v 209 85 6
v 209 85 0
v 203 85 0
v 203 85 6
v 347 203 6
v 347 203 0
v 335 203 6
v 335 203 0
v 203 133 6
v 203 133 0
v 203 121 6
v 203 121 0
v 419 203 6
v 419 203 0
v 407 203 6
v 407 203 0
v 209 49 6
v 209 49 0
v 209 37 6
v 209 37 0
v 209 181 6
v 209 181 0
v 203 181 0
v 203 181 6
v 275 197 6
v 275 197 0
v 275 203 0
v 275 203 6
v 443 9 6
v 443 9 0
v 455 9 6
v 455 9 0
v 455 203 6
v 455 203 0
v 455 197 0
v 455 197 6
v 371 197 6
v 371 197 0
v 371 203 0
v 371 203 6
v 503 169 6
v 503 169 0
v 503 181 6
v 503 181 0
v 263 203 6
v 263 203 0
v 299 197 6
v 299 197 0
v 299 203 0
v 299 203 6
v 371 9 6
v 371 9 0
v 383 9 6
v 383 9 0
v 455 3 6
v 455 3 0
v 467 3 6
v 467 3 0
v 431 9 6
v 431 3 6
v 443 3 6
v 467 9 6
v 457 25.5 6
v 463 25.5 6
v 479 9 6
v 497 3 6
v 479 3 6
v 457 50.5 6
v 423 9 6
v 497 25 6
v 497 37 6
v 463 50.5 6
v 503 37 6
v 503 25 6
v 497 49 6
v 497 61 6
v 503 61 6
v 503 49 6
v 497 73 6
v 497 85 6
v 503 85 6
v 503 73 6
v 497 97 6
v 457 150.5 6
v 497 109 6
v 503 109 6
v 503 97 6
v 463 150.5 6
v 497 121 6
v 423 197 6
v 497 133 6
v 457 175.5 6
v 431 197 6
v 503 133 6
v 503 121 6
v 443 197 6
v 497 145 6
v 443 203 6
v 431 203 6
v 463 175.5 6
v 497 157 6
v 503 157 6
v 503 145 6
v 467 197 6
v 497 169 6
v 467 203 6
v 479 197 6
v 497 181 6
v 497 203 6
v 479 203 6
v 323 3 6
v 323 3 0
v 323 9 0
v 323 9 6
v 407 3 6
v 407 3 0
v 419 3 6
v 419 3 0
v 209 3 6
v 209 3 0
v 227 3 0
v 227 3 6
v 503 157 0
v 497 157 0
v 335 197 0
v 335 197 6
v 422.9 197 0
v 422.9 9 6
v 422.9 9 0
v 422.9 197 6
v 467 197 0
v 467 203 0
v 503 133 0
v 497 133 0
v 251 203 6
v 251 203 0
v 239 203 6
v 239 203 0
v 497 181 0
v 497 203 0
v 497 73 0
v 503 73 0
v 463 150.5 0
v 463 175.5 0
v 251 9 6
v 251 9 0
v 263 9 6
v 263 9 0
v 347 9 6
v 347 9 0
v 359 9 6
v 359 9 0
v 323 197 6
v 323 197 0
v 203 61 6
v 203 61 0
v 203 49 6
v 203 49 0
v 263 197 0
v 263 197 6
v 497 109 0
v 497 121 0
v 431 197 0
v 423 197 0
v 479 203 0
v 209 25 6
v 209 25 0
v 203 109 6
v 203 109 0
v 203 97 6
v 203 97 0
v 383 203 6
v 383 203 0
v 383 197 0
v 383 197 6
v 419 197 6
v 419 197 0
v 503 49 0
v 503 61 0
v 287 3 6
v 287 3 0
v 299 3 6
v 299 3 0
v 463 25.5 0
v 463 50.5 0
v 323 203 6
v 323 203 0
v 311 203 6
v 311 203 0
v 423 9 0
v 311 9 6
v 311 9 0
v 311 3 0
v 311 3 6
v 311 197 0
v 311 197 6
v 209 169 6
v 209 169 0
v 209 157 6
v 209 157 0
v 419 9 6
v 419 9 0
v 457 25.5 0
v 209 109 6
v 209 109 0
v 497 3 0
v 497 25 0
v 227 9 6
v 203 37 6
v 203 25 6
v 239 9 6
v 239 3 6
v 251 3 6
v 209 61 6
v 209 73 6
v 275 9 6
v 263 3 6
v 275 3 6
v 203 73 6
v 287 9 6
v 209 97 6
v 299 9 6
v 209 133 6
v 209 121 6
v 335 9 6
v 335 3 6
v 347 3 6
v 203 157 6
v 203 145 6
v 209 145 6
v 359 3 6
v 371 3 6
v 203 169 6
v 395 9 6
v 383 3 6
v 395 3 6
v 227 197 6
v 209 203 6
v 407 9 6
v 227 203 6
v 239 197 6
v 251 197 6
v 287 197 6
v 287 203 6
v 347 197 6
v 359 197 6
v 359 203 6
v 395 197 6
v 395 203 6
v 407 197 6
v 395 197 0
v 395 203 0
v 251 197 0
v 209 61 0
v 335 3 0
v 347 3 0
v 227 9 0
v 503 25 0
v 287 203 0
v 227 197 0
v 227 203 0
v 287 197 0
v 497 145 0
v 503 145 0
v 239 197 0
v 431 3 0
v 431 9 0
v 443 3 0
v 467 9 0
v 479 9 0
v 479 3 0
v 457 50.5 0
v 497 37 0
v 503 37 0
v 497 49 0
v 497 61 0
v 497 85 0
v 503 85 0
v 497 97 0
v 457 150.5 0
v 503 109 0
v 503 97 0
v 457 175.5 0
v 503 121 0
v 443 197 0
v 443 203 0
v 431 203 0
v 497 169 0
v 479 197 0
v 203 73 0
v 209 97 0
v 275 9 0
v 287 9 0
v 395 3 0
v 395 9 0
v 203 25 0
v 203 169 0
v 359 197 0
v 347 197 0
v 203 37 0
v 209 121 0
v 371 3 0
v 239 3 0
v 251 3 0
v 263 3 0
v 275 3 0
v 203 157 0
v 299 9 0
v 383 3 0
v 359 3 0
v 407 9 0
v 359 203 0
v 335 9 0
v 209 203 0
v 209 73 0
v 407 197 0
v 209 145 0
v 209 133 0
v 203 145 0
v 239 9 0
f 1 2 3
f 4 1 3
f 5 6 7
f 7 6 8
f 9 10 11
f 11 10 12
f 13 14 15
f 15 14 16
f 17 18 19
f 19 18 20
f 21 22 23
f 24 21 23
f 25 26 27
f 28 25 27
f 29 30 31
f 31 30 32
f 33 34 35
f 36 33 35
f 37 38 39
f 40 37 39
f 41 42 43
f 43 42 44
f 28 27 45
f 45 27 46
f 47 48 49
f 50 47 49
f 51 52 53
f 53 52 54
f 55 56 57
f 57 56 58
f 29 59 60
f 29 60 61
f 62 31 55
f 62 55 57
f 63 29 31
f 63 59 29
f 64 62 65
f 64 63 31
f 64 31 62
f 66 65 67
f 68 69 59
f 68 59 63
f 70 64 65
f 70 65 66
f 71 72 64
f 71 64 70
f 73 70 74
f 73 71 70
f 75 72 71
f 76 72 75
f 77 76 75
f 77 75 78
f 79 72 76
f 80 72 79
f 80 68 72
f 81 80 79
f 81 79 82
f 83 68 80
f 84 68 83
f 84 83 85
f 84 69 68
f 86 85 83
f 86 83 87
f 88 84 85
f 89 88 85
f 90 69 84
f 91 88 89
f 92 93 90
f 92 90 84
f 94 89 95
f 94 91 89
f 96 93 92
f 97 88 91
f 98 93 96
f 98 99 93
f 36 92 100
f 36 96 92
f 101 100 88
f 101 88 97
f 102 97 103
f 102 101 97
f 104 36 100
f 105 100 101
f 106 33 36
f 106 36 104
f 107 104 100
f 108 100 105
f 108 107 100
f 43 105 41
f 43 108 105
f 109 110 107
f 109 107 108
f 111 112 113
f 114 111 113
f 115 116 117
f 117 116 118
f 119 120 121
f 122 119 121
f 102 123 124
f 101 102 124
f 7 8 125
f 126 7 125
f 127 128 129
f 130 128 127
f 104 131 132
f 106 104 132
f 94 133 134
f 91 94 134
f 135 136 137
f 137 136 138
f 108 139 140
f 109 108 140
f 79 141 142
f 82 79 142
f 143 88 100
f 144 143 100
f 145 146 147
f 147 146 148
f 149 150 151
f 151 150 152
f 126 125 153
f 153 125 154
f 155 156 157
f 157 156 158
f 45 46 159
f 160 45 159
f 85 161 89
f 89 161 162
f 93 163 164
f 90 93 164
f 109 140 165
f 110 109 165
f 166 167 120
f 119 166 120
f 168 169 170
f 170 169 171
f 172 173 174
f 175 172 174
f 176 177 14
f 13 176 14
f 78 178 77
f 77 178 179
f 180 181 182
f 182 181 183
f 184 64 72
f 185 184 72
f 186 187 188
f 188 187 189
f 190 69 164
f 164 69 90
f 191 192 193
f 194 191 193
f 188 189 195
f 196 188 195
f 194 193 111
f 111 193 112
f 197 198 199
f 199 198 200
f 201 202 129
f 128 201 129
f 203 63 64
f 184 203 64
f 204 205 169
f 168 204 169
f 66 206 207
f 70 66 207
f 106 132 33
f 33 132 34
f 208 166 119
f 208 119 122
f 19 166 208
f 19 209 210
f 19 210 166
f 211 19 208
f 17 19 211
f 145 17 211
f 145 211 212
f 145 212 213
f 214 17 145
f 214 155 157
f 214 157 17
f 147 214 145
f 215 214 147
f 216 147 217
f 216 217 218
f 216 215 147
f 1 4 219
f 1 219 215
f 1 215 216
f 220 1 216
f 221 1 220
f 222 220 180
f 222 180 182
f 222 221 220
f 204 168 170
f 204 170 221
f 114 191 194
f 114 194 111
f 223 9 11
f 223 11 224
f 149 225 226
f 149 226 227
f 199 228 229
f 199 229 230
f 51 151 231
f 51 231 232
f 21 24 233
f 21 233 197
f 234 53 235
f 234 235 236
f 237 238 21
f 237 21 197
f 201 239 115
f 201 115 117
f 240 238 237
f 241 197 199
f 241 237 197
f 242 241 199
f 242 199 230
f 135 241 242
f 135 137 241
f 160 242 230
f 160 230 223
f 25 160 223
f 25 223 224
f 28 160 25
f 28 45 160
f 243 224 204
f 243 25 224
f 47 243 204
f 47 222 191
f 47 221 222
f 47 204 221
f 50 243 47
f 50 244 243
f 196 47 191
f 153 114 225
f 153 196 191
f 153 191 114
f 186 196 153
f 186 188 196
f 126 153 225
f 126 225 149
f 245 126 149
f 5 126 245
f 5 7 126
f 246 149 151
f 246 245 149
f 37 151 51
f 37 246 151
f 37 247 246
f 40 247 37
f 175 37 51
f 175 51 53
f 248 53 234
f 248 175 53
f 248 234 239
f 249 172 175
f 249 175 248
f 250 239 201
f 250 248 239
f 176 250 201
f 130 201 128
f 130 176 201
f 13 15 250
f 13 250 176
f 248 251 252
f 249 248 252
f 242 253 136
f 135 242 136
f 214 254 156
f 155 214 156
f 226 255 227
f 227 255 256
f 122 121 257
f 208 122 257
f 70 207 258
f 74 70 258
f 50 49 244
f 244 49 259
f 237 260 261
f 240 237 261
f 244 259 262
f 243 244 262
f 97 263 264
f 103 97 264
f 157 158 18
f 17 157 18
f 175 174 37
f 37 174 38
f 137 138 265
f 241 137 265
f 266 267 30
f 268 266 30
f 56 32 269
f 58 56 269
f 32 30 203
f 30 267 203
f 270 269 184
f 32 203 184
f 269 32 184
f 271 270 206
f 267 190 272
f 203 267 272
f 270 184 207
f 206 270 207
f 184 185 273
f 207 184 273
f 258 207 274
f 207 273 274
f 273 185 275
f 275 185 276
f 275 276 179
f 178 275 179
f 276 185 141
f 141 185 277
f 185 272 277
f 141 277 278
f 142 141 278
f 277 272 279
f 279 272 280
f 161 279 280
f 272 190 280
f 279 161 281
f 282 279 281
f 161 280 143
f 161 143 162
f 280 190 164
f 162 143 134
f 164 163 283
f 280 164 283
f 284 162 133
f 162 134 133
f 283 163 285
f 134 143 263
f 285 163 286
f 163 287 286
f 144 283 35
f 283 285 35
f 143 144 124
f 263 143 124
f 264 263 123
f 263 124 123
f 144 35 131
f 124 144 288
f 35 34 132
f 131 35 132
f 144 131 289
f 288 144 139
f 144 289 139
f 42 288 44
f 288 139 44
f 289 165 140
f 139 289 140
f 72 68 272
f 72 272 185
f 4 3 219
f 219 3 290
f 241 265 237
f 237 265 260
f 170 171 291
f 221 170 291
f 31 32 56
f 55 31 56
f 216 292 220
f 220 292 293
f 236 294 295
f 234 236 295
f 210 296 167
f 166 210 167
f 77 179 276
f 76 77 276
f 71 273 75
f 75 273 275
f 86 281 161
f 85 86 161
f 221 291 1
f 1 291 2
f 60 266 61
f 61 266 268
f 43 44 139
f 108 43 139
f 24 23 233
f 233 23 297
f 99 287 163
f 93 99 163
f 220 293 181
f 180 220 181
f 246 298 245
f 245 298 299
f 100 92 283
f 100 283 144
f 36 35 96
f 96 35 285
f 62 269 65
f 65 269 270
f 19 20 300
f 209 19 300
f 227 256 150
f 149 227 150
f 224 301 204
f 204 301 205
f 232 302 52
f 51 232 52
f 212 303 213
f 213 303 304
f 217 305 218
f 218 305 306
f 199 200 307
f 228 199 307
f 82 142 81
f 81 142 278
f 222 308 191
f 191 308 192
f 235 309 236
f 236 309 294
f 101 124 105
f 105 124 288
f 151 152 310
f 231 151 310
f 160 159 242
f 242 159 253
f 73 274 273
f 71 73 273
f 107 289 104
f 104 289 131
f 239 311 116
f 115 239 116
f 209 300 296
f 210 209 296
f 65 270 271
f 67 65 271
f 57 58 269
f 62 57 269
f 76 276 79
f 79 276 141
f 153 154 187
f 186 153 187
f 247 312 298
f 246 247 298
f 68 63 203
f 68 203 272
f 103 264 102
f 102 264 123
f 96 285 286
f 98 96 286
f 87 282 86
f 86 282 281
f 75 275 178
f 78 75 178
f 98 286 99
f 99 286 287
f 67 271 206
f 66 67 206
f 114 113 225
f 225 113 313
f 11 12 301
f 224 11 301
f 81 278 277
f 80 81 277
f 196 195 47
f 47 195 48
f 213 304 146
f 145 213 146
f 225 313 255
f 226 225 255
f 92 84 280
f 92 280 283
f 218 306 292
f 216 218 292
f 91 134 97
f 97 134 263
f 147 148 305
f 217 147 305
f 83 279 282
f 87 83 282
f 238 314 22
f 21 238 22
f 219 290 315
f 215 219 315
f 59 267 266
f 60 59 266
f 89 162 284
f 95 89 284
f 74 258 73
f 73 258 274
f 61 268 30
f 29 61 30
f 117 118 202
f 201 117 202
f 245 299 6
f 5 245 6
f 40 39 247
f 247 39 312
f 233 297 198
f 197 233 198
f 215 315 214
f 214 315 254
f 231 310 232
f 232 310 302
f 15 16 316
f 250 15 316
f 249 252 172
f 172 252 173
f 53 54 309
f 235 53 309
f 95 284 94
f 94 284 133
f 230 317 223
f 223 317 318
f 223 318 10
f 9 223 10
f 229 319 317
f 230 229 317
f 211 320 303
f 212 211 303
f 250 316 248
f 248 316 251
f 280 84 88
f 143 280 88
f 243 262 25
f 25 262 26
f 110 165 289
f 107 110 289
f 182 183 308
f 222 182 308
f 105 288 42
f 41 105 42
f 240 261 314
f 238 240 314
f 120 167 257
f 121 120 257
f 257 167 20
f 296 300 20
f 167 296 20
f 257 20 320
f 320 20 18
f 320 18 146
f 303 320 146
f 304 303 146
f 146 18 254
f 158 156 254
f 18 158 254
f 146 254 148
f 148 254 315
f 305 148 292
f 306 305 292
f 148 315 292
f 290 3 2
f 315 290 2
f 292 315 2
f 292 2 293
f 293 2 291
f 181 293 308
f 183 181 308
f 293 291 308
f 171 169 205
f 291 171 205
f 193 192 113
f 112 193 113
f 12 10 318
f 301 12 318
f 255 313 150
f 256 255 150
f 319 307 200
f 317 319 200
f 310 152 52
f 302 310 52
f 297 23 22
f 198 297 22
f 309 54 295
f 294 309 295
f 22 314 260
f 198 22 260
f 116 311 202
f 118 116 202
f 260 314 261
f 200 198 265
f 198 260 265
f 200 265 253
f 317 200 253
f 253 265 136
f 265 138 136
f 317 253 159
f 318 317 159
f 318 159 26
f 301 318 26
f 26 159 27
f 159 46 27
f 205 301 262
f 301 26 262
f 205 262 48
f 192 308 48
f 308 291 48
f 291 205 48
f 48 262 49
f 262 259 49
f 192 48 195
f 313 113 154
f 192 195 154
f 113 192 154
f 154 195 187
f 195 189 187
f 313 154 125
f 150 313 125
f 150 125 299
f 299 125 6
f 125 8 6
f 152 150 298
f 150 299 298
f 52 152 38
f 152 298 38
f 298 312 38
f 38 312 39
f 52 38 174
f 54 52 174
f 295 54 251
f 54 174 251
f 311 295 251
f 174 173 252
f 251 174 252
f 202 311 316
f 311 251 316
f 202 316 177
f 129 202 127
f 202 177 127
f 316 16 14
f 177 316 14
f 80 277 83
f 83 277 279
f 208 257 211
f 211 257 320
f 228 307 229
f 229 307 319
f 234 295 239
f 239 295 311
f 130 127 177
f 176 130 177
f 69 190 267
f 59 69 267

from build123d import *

# Parameters (mm, degrees)
BOSS_EXTRUDE1_DEPTH = 6
SKETCH2_W           = 6
SKETCH2_H           = 25
SKETCH2_W_2         = 0.1
SKETCH2_H_2         = 235.31007752
CUT_EXTRUDE1_DEPTH  = 6


with BuildPart() as part:
    # Model → Boss-Extrude1 (new body)
    with BuildSketch(Plane.XY):
        Polygon((209, 203), (209, 181), (203, 181), (203, 169), (209, 169), (209, 157), (203, 157), (203, 145), (209, 145), (209, 133), (203, 133), (203, 121), (209, 121), (209, 109), (203, 109), (203, 97), (209, 97), (209, 85), (203, 85), (203, 73), (209, 73), (209, 61), (203, 61), (203, 49), (209, 49), (209, 37), (203, 37), (203, 25), (209, 25), (209, 13), (209, 3), (227, 3), (227, 9), (239, 9), (239, 3), (251, 3), (251, 9), (263, 9), (263, 3), (275, 3), (275, 9), (287, 9), (287, 3), (299, 3), (299, 9), (311, 9), (311, 3), (323, 3), (323, 9), (335, 9), (335, 3), (347, 3), (347, 9), (359, 9), (359, 3), (371, 3), (371, 9), (383, 9), (383, 3), (395, 3), (395, 9), (407, 9), (407, 3), (419, 3), (419, 9), (431, 9), (431, 3), (443, 3), (443, 9), (455, 9), (455, 3), (467, 3), (467, 9), (479, 9), (479, 3), (491, 3), (497, 3), (497, 25), (503, 25), (503, 37), (497, 37), (497, 49), (503, 49), (503, 61), (497, 61), (497, 73), (503, 73), (503, 85), (497, 85), (497, 97), (503, 97), (503, 109), (497, 109), (497, 121), (503, 121), (503, 133), (497, 133), (497, 145), (503, 145), (503, 157), (497, 157), (497, 169), (503, 169), (503, 181), (497, 181), (497, 193), (497, 203), (479, 203), (479, 197), (467, 197), (467, 203), (455, 203), (455, 197), (443, 197), (443, 203), (431, 203), (431, 197), (419, 197), (419, 203), (407, 203), (407, 197), (395, 197), (395, 203), (383, 203), (383, 197), (371, 197), (371, 203), (359, 203), (359, 197), (347, 197), (347, 203), (335, 203), (335, 197), (323, 197), (323, 203), (311, 203), (311, 197), (299, 197), (299, 203), (287, 203), (287, 197), (275, 197), (275, 203), (263, 203), (263, 197), (251, 197), (251, 203), (239, 203), (239, 197), (227, 197), (227, 203), (215, 203), align=None)
    extrude(amount=BOSS_EXTRUDE1_DEPTH)

    # Sketch2 → Cut-Extrude1 (cut)
    with BuildSketch(Plane.XY.offset(6)):
        with Locations((460, 38)):
            Rectangle(SKETCH2_W, SKETCH2_H)
        with Locations((422.95, 100.5)):
            Rectangle(SKETCH2_W_2, SKETCH2_H_2)
        with Locations((460, 163)):
            Rectangle(SKETCH2_W, SKETCH2_H)
    extrude(amount=-CUT_EXTRUDE1_DEPTH, mode=Mode.SUBTRACT)


with BuildPart() as cut_extrude1_piece_1:
    # of the separate pieces the step leaves, piece 1, a body of its own (cut_extrude1_pieces)
    add(part.part.solids().sort_by_distance((209, 203, 0))[0])


with BuildPart() as cut_extrude1_piece_2:
    # of the separate pieces the step leaves, piece 2, a body of its own (cut_extrude1_pieces)
    add(part.part.solids().sort_by_distance((431, 197, 0))[0])


solid = Compound([cut_extrude1_piece_1.part, cut_extrude1_piece_2.part])
